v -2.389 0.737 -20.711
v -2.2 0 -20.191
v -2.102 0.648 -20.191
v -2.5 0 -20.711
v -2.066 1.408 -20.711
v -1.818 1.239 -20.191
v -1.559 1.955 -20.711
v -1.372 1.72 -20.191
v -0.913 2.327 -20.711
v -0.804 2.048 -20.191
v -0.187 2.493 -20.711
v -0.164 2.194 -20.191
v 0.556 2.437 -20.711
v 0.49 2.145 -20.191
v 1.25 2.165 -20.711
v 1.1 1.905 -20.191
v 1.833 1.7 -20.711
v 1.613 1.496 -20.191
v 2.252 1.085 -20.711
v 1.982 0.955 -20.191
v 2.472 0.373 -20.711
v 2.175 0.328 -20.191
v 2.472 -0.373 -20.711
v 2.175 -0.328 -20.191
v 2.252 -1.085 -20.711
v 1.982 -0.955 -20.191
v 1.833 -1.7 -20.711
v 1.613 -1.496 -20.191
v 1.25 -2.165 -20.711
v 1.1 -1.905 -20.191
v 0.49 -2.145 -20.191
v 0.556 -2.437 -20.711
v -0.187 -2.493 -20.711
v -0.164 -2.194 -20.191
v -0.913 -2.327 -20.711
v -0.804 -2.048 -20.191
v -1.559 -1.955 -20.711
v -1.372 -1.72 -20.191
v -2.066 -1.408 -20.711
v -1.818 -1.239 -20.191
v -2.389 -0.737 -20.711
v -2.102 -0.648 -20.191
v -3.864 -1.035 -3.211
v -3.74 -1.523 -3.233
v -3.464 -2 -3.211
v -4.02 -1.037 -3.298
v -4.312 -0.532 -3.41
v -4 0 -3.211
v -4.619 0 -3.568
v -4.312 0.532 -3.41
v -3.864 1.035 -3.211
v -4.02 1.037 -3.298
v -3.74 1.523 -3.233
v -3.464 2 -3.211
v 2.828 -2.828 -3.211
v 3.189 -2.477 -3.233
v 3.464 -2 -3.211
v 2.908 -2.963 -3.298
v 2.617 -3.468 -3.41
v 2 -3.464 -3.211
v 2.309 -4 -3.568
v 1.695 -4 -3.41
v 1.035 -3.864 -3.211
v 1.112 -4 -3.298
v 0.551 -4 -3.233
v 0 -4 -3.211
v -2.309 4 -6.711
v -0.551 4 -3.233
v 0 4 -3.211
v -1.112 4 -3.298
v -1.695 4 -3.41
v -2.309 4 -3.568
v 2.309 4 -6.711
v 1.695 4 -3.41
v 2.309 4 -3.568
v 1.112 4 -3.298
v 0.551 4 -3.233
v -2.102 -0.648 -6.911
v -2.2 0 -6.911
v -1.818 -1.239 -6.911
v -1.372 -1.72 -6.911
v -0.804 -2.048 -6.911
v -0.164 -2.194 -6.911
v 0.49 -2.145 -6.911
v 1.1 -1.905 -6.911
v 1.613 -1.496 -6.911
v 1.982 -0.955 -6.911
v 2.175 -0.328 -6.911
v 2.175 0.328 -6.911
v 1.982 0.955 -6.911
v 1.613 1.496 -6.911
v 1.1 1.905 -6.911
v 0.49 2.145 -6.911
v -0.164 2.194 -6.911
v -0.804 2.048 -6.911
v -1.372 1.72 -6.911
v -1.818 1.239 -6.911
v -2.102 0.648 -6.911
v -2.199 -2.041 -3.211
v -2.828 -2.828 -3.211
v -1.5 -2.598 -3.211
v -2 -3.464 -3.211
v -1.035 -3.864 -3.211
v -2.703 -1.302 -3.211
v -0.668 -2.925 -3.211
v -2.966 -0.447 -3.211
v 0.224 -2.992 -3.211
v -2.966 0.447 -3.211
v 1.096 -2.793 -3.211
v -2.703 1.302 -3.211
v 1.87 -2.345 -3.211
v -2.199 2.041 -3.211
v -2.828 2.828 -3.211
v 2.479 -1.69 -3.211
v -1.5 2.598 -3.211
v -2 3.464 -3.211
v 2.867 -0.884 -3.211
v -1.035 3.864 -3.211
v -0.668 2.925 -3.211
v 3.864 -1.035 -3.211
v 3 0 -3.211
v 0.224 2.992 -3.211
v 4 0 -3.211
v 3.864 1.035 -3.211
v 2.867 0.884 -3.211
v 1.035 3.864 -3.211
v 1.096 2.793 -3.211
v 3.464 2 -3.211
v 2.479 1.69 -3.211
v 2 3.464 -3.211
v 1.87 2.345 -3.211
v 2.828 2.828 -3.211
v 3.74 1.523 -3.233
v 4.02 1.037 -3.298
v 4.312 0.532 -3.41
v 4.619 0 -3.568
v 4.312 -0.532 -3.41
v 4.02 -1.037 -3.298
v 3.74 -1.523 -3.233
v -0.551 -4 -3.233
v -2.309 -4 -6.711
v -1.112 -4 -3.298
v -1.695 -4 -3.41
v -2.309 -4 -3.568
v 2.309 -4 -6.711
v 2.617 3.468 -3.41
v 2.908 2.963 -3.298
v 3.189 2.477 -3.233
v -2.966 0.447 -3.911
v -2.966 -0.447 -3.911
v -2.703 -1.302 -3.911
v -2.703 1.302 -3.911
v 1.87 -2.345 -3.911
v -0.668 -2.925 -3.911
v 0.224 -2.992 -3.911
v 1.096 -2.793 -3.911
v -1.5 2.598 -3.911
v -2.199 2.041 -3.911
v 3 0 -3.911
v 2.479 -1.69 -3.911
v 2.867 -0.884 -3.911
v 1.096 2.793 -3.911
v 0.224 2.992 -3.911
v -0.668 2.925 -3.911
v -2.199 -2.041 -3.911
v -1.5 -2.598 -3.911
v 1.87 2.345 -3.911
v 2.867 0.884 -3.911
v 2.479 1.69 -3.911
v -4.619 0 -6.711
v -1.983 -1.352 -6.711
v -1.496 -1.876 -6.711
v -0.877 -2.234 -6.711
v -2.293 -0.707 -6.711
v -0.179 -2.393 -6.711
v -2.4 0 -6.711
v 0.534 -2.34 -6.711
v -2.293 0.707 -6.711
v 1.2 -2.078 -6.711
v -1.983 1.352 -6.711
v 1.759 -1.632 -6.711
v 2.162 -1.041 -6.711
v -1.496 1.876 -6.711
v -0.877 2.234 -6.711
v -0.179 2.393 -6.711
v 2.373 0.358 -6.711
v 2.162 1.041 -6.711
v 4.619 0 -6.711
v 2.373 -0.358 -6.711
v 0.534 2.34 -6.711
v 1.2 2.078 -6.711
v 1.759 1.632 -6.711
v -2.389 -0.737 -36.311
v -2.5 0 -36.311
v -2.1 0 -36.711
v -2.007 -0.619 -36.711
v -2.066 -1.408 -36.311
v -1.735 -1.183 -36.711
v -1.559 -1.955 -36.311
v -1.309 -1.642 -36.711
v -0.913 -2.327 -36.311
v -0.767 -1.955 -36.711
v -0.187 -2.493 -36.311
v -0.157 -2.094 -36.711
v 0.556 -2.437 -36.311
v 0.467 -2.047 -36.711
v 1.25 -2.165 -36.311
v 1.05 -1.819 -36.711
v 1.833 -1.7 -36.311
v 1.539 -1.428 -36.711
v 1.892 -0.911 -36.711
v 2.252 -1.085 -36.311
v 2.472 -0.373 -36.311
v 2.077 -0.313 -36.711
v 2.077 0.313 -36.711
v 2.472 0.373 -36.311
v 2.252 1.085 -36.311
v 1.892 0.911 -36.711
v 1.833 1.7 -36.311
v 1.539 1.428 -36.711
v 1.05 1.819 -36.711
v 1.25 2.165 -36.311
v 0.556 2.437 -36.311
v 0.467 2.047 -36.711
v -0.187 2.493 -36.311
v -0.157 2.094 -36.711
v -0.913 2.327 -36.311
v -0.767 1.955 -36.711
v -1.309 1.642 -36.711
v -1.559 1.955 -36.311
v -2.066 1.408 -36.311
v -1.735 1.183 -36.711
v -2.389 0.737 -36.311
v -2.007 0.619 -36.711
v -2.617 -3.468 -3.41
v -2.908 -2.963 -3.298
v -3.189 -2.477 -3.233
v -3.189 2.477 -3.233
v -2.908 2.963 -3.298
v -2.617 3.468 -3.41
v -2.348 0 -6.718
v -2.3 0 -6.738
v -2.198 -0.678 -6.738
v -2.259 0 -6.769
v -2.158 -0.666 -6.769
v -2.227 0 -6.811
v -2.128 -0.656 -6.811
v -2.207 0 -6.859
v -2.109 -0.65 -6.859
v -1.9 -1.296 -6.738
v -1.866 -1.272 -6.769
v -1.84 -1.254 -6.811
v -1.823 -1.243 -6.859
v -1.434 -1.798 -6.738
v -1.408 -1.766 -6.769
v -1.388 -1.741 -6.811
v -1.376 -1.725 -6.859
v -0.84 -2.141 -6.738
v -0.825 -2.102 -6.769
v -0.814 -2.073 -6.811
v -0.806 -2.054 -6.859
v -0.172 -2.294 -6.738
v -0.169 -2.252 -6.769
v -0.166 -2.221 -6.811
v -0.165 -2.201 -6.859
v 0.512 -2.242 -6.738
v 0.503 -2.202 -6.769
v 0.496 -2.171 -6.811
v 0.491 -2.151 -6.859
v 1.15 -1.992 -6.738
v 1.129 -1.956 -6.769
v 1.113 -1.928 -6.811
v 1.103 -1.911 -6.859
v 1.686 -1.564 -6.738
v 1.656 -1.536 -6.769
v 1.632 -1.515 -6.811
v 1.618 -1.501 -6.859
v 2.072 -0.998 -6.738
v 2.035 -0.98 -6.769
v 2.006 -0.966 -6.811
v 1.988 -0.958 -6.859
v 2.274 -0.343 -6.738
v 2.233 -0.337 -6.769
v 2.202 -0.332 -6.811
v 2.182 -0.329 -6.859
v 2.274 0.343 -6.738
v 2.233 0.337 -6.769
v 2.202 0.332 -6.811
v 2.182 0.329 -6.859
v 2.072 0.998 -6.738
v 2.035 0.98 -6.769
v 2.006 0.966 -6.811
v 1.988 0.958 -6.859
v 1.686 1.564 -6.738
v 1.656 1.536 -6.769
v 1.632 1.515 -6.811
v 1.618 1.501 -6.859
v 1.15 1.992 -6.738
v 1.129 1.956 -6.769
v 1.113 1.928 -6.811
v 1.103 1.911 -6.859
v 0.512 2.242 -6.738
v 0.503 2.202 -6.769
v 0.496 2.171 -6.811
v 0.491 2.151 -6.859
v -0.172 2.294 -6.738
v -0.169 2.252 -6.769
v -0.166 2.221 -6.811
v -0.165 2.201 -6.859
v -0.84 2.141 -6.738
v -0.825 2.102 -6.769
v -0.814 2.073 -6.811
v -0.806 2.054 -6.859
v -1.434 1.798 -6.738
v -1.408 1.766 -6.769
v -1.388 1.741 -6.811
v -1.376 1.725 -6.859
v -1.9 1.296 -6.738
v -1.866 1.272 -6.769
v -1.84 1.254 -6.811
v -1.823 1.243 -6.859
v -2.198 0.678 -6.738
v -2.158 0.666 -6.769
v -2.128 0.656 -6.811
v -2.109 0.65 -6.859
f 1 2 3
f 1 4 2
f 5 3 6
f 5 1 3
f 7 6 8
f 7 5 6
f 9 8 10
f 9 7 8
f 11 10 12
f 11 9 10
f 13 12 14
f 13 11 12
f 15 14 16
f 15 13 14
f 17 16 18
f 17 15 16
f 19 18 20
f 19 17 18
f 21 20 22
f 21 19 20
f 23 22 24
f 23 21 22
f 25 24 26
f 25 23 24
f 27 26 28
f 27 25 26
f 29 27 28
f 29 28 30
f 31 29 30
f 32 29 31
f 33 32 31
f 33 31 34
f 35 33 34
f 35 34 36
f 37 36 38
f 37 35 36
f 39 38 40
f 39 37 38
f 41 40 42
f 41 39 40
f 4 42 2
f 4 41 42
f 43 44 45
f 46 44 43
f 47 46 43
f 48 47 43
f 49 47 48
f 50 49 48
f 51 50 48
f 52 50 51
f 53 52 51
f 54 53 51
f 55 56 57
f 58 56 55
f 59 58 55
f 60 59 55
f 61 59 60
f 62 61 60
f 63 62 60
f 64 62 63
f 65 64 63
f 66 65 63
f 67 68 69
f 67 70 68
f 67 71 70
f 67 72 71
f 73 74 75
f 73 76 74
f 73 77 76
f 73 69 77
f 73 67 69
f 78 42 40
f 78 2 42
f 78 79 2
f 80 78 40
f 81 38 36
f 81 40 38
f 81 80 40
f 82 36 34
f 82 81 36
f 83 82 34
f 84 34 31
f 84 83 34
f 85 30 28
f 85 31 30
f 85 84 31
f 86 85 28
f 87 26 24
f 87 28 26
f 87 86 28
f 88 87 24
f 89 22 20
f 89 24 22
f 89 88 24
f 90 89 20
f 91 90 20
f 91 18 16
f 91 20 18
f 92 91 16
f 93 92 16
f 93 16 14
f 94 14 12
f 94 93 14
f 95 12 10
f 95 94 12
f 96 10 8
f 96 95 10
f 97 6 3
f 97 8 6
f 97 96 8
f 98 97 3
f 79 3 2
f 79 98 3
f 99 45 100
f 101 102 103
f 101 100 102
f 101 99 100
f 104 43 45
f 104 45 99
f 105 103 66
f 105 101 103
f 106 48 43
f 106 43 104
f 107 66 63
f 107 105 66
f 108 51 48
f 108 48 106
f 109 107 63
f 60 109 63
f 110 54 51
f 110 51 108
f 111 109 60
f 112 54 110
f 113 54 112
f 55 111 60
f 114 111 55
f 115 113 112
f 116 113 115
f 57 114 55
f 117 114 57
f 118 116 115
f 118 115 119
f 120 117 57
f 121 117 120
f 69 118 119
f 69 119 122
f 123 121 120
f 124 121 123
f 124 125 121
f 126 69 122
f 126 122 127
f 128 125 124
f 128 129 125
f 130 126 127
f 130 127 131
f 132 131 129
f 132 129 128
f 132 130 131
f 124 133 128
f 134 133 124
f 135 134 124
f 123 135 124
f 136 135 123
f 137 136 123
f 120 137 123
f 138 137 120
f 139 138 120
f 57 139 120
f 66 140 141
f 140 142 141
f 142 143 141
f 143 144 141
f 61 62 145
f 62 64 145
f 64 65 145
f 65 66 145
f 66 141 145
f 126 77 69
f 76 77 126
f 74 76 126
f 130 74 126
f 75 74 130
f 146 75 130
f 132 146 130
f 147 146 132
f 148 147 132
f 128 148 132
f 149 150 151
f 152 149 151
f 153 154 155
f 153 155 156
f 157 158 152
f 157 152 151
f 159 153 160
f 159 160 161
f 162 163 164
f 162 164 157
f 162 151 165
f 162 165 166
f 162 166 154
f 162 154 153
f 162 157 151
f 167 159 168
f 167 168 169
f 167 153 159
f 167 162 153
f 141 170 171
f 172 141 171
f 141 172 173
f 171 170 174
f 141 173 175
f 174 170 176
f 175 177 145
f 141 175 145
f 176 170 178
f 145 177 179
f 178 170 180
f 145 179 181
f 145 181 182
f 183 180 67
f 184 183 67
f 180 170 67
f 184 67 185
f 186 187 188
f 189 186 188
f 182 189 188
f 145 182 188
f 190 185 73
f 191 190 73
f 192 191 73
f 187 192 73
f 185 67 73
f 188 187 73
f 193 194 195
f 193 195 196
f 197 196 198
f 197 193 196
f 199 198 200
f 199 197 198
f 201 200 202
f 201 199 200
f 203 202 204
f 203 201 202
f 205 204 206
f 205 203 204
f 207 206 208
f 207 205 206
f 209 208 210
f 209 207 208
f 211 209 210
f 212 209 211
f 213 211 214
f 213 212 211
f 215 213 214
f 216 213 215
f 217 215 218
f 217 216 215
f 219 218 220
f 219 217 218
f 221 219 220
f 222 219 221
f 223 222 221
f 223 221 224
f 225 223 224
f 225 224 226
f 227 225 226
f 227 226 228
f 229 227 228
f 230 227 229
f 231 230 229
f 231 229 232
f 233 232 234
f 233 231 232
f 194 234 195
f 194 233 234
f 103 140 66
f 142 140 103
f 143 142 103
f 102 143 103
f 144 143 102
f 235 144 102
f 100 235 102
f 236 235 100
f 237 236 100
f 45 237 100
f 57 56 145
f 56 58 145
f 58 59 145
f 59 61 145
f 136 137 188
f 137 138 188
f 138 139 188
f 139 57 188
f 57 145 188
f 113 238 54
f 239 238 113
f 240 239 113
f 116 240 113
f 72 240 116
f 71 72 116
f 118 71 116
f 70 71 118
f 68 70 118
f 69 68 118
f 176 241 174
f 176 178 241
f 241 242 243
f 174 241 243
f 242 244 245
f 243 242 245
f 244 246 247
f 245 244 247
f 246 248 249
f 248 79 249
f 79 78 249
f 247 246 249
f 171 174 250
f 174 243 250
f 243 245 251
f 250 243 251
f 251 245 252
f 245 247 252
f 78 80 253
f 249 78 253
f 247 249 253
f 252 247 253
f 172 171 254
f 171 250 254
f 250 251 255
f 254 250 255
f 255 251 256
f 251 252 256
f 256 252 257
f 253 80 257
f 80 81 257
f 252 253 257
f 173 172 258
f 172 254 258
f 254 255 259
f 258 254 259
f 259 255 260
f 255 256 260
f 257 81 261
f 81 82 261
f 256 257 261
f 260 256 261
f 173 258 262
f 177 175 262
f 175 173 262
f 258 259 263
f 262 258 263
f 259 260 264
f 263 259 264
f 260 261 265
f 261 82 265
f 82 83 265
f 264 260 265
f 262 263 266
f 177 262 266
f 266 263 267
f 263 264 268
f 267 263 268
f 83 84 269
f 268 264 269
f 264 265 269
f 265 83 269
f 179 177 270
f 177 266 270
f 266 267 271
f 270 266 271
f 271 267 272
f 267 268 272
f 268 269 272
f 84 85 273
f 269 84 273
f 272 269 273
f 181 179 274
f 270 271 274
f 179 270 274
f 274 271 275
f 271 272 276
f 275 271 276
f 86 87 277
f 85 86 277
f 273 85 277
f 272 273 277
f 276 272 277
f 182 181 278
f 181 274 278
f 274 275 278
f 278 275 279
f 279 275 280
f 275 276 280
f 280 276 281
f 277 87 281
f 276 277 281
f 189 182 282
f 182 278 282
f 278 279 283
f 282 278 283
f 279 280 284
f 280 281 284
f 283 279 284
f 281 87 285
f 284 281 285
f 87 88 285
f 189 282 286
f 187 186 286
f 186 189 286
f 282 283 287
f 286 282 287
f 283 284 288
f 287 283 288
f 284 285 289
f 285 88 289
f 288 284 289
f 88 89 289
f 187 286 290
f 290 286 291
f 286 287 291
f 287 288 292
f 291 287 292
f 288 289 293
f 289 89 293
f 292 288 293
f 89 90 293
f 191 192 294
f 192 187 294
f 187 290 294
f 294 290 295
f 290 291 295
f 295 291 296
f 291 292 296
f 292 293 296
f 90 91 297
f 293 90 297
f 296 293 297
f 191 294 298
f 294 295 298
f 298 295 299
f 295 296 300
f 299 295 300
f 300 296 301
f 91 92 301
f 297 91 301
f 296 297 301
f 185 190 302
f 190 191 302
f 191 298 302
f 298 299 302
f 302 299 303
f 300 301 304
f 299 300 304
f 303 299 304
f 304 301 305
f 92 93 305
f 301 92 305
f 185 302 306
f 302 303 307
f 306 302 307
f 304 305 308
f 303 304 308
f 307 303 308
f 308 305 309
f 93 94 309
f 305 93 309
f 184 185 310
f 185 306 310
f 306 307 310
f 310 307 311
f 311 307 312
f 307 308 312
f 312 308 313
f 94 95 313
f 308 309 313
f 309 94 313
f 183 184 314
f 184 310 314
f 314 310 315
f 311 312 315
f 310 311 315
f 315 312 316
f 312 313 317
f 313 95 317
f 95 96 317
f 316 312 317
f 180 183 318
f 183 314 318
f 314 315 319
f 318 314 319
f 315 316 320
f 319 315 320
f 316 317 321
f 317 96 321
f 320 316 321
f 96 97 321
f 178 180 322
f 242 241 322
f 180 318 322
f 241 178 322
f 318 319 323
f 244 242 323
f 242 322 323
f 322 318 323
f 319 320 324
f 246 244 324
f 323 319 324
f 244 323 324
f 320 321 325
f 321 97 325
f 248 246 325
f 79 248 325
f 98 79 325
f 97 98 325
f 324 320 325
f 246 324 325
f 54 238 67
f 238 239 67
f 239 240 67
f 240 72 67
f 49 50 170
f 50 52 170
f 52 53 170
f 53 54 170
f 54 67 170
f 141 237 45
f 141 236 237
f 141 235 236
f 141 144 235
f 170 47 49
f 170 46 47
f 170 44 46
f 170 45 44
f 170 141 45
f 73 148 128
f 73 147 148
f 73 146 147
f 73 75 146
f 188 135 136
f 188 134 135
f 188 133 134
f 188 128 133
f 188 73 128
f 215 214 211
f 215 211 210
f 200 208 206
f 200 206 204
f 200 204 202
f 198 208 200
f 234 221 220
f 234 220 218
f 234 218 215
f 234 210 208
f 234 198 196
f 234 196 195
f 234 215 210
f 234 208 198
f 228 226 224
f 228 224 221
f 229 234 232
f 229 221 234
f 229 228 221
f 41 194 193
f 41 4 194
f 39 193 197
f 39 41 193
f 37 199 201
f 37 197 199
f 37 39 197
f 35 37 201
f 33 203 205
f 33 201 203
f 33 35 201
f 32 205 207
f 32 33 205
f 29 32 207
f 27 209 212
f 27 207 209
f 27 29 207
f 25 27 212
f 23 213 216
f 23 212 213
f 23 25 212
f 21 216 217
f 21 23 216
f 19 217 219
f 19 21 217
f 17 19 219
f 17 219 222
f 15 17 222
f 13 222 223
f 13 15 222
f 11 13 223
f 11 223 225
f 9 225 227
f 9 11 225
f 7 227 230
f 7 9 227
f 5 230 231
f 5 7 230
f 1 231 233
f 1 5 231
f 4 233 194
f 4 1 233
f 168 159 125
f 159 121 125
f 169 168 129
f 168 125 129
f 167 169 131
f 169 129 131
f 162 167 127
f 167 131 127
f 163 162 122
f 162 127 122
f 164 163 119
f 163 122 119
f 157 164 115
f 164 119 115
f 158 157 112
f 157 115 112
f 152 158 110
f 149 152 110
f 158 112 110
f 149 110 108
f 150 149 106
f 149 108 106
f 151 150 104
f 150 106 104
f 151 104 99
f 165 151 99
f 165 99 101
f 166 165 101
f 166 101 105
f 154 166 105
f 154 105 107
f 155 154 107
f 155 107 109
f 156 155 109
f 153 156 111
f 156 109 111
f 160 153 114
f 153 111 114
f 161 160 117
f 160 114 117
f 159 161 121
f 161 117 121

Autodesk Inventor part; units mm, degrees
ref_plane "YZ Plane" through (0, 0, 0) normal (1, 0, 0) x (0, 1, 0)
sketch "Sketch2" plane through (0, 0, 0) normal (0, 1, 0) x (-1, 0, 0)
  line L0 (0, -6.7108) -> (0, -36.7108)
  line L1 (0, -36.7108) -> (2.1, -36.7108)
  line L2 (2.5, -36.3108) -> (2.5, -20.7108)
  line L3 (2.5, -20.7108) -> (2.2, -20.1912)
  line L4 (2.2, -20.1912) -> (2.2, -6.7108)
  line L5 (2.2, -6.7108) -> (0, -6.7108)
  line L6 (2.1, -36.7108) -> (2.5, -36.3108)
  line L7 (2.5, -36.7108) -> (2.5, -37.2765)
  line L8 (0, -43.3897) -> (0, -0.5977) projected
  dimension "Ds" = 4.4
  dimension "NND" = 5
  dimension "b" = 16
  dimension "d3" = 30
  dimension "d5" = 45
  dimension "PTC" = 0.8
  dimension "NLG" = 30
revolve "Revolution1" add sketch "Sketch2" angle 360 about axis through (0, 0, -6.7108) along (0, 0, -1)
sketch "Sketch3" plane through (0, 0, -6.7108) normal (0, 0, 1) x (1, 0, 0)
  circle A0 centre (0, 0) radius 2.2 projected
  line L0 (0, 4) -> (2.3094, 4)
  line L1 (2.3094, 4) -> (4.6188, 0)
  line L2 (4.6188, 0) -> (0, 0)
  line L3 (0, 0) -> (0, 4)
  line L4 (0, 4) -> (-2.3094, 4)
  line L5 (-2.3094, 4) -> (-4.6188, 0)
  line L6 (0, -4) -> (2.3094, -4)
  line L7 (2.3094, -4) -> (4.6188, 0)
  line L8 (-2.3094, -4) -> (-4.6188, 0)
  line L9 (0, -4) -> (-2.3094, -4)
  dimension "d9" = 60
  dimension "ParS" = 8
  dimension "msp_d11" = 8
extrude "Extrusion1" add sketch "Sketch3" along normal blind 3.5
sketch "Sketch4" plane through (0, 0, 0) normal (0, 1, 0) x (-1, 0, 0)
  line L0 (-4, -3.2108) -> (-4.6188, -3.2108)
  line L1 (-4.6188, -3.2108) -> (-4.6188, -3.5681)
  line L2 (-4.6188, -3.5681) -> (-4, -3.2108)
  line L3 (0, -13.5602) -> (0, 34.3854) projected
  line L4 (0, 27.536) -> (0, 27.1787)
  line L5 (-4.6188, -6.7108) -> (-4.6188, -3.2108) projected
  line L6 (-2.3094, -3.2108) -> (-4.6188, -3.2108) projected
  dimension "d14" = 30
  dimension "msp_d15" = 8
revolve "Revolution2" cut sketch "Sketch4" angle 360 about axis through (0, 0, 27.536) along (0, 0, -1)
sketch "Sketch5" plane through (0, 0, -3.2108) normal (0, 0, 1) x (1, 0, 0)
  arc A0 (3.4641, 2) -> (0, 4) centre (0, 0) ccw projected
  circle A1 centre (0, 0) radius 3
  dimension "d27" = 6
extrude "Extrusion2" cut sketch "Sketch5" against normal blind 0.7
thread "Thread1" size "M5x0.8" class "6g" standard "ISO Metric profile" full length
ref_plane "MSC_PF1" through (0, 0, 0) normal (0, 1, 0) x (-1, 0, 0)
ref_plane "MSC_PT1" through (0, 0, -6.7108) normal (0, 0, -1) x (-1, 0, 0)
fillet "Fillet1" radius 0.2 1 edges at (2.2, 0, -6.7108)
equation "\"msp_d11\" = ParS"
equation "\"msp_d15\" = ParS"
equation "\"d27\" = 0.75 * ParS"
equation "\"d28\" = 0.2 * ParK"
equation "\"d30\" = r"
equation "\"msp_d17\" = b"
equation "\"r\" = 0.2"
equation "\"THREADDIA\" = NND"
equation "\"ParK\" = 3.5"
properties part number "ISO 4015 - M5 x 30" material "Stainless Steel, 440C"
